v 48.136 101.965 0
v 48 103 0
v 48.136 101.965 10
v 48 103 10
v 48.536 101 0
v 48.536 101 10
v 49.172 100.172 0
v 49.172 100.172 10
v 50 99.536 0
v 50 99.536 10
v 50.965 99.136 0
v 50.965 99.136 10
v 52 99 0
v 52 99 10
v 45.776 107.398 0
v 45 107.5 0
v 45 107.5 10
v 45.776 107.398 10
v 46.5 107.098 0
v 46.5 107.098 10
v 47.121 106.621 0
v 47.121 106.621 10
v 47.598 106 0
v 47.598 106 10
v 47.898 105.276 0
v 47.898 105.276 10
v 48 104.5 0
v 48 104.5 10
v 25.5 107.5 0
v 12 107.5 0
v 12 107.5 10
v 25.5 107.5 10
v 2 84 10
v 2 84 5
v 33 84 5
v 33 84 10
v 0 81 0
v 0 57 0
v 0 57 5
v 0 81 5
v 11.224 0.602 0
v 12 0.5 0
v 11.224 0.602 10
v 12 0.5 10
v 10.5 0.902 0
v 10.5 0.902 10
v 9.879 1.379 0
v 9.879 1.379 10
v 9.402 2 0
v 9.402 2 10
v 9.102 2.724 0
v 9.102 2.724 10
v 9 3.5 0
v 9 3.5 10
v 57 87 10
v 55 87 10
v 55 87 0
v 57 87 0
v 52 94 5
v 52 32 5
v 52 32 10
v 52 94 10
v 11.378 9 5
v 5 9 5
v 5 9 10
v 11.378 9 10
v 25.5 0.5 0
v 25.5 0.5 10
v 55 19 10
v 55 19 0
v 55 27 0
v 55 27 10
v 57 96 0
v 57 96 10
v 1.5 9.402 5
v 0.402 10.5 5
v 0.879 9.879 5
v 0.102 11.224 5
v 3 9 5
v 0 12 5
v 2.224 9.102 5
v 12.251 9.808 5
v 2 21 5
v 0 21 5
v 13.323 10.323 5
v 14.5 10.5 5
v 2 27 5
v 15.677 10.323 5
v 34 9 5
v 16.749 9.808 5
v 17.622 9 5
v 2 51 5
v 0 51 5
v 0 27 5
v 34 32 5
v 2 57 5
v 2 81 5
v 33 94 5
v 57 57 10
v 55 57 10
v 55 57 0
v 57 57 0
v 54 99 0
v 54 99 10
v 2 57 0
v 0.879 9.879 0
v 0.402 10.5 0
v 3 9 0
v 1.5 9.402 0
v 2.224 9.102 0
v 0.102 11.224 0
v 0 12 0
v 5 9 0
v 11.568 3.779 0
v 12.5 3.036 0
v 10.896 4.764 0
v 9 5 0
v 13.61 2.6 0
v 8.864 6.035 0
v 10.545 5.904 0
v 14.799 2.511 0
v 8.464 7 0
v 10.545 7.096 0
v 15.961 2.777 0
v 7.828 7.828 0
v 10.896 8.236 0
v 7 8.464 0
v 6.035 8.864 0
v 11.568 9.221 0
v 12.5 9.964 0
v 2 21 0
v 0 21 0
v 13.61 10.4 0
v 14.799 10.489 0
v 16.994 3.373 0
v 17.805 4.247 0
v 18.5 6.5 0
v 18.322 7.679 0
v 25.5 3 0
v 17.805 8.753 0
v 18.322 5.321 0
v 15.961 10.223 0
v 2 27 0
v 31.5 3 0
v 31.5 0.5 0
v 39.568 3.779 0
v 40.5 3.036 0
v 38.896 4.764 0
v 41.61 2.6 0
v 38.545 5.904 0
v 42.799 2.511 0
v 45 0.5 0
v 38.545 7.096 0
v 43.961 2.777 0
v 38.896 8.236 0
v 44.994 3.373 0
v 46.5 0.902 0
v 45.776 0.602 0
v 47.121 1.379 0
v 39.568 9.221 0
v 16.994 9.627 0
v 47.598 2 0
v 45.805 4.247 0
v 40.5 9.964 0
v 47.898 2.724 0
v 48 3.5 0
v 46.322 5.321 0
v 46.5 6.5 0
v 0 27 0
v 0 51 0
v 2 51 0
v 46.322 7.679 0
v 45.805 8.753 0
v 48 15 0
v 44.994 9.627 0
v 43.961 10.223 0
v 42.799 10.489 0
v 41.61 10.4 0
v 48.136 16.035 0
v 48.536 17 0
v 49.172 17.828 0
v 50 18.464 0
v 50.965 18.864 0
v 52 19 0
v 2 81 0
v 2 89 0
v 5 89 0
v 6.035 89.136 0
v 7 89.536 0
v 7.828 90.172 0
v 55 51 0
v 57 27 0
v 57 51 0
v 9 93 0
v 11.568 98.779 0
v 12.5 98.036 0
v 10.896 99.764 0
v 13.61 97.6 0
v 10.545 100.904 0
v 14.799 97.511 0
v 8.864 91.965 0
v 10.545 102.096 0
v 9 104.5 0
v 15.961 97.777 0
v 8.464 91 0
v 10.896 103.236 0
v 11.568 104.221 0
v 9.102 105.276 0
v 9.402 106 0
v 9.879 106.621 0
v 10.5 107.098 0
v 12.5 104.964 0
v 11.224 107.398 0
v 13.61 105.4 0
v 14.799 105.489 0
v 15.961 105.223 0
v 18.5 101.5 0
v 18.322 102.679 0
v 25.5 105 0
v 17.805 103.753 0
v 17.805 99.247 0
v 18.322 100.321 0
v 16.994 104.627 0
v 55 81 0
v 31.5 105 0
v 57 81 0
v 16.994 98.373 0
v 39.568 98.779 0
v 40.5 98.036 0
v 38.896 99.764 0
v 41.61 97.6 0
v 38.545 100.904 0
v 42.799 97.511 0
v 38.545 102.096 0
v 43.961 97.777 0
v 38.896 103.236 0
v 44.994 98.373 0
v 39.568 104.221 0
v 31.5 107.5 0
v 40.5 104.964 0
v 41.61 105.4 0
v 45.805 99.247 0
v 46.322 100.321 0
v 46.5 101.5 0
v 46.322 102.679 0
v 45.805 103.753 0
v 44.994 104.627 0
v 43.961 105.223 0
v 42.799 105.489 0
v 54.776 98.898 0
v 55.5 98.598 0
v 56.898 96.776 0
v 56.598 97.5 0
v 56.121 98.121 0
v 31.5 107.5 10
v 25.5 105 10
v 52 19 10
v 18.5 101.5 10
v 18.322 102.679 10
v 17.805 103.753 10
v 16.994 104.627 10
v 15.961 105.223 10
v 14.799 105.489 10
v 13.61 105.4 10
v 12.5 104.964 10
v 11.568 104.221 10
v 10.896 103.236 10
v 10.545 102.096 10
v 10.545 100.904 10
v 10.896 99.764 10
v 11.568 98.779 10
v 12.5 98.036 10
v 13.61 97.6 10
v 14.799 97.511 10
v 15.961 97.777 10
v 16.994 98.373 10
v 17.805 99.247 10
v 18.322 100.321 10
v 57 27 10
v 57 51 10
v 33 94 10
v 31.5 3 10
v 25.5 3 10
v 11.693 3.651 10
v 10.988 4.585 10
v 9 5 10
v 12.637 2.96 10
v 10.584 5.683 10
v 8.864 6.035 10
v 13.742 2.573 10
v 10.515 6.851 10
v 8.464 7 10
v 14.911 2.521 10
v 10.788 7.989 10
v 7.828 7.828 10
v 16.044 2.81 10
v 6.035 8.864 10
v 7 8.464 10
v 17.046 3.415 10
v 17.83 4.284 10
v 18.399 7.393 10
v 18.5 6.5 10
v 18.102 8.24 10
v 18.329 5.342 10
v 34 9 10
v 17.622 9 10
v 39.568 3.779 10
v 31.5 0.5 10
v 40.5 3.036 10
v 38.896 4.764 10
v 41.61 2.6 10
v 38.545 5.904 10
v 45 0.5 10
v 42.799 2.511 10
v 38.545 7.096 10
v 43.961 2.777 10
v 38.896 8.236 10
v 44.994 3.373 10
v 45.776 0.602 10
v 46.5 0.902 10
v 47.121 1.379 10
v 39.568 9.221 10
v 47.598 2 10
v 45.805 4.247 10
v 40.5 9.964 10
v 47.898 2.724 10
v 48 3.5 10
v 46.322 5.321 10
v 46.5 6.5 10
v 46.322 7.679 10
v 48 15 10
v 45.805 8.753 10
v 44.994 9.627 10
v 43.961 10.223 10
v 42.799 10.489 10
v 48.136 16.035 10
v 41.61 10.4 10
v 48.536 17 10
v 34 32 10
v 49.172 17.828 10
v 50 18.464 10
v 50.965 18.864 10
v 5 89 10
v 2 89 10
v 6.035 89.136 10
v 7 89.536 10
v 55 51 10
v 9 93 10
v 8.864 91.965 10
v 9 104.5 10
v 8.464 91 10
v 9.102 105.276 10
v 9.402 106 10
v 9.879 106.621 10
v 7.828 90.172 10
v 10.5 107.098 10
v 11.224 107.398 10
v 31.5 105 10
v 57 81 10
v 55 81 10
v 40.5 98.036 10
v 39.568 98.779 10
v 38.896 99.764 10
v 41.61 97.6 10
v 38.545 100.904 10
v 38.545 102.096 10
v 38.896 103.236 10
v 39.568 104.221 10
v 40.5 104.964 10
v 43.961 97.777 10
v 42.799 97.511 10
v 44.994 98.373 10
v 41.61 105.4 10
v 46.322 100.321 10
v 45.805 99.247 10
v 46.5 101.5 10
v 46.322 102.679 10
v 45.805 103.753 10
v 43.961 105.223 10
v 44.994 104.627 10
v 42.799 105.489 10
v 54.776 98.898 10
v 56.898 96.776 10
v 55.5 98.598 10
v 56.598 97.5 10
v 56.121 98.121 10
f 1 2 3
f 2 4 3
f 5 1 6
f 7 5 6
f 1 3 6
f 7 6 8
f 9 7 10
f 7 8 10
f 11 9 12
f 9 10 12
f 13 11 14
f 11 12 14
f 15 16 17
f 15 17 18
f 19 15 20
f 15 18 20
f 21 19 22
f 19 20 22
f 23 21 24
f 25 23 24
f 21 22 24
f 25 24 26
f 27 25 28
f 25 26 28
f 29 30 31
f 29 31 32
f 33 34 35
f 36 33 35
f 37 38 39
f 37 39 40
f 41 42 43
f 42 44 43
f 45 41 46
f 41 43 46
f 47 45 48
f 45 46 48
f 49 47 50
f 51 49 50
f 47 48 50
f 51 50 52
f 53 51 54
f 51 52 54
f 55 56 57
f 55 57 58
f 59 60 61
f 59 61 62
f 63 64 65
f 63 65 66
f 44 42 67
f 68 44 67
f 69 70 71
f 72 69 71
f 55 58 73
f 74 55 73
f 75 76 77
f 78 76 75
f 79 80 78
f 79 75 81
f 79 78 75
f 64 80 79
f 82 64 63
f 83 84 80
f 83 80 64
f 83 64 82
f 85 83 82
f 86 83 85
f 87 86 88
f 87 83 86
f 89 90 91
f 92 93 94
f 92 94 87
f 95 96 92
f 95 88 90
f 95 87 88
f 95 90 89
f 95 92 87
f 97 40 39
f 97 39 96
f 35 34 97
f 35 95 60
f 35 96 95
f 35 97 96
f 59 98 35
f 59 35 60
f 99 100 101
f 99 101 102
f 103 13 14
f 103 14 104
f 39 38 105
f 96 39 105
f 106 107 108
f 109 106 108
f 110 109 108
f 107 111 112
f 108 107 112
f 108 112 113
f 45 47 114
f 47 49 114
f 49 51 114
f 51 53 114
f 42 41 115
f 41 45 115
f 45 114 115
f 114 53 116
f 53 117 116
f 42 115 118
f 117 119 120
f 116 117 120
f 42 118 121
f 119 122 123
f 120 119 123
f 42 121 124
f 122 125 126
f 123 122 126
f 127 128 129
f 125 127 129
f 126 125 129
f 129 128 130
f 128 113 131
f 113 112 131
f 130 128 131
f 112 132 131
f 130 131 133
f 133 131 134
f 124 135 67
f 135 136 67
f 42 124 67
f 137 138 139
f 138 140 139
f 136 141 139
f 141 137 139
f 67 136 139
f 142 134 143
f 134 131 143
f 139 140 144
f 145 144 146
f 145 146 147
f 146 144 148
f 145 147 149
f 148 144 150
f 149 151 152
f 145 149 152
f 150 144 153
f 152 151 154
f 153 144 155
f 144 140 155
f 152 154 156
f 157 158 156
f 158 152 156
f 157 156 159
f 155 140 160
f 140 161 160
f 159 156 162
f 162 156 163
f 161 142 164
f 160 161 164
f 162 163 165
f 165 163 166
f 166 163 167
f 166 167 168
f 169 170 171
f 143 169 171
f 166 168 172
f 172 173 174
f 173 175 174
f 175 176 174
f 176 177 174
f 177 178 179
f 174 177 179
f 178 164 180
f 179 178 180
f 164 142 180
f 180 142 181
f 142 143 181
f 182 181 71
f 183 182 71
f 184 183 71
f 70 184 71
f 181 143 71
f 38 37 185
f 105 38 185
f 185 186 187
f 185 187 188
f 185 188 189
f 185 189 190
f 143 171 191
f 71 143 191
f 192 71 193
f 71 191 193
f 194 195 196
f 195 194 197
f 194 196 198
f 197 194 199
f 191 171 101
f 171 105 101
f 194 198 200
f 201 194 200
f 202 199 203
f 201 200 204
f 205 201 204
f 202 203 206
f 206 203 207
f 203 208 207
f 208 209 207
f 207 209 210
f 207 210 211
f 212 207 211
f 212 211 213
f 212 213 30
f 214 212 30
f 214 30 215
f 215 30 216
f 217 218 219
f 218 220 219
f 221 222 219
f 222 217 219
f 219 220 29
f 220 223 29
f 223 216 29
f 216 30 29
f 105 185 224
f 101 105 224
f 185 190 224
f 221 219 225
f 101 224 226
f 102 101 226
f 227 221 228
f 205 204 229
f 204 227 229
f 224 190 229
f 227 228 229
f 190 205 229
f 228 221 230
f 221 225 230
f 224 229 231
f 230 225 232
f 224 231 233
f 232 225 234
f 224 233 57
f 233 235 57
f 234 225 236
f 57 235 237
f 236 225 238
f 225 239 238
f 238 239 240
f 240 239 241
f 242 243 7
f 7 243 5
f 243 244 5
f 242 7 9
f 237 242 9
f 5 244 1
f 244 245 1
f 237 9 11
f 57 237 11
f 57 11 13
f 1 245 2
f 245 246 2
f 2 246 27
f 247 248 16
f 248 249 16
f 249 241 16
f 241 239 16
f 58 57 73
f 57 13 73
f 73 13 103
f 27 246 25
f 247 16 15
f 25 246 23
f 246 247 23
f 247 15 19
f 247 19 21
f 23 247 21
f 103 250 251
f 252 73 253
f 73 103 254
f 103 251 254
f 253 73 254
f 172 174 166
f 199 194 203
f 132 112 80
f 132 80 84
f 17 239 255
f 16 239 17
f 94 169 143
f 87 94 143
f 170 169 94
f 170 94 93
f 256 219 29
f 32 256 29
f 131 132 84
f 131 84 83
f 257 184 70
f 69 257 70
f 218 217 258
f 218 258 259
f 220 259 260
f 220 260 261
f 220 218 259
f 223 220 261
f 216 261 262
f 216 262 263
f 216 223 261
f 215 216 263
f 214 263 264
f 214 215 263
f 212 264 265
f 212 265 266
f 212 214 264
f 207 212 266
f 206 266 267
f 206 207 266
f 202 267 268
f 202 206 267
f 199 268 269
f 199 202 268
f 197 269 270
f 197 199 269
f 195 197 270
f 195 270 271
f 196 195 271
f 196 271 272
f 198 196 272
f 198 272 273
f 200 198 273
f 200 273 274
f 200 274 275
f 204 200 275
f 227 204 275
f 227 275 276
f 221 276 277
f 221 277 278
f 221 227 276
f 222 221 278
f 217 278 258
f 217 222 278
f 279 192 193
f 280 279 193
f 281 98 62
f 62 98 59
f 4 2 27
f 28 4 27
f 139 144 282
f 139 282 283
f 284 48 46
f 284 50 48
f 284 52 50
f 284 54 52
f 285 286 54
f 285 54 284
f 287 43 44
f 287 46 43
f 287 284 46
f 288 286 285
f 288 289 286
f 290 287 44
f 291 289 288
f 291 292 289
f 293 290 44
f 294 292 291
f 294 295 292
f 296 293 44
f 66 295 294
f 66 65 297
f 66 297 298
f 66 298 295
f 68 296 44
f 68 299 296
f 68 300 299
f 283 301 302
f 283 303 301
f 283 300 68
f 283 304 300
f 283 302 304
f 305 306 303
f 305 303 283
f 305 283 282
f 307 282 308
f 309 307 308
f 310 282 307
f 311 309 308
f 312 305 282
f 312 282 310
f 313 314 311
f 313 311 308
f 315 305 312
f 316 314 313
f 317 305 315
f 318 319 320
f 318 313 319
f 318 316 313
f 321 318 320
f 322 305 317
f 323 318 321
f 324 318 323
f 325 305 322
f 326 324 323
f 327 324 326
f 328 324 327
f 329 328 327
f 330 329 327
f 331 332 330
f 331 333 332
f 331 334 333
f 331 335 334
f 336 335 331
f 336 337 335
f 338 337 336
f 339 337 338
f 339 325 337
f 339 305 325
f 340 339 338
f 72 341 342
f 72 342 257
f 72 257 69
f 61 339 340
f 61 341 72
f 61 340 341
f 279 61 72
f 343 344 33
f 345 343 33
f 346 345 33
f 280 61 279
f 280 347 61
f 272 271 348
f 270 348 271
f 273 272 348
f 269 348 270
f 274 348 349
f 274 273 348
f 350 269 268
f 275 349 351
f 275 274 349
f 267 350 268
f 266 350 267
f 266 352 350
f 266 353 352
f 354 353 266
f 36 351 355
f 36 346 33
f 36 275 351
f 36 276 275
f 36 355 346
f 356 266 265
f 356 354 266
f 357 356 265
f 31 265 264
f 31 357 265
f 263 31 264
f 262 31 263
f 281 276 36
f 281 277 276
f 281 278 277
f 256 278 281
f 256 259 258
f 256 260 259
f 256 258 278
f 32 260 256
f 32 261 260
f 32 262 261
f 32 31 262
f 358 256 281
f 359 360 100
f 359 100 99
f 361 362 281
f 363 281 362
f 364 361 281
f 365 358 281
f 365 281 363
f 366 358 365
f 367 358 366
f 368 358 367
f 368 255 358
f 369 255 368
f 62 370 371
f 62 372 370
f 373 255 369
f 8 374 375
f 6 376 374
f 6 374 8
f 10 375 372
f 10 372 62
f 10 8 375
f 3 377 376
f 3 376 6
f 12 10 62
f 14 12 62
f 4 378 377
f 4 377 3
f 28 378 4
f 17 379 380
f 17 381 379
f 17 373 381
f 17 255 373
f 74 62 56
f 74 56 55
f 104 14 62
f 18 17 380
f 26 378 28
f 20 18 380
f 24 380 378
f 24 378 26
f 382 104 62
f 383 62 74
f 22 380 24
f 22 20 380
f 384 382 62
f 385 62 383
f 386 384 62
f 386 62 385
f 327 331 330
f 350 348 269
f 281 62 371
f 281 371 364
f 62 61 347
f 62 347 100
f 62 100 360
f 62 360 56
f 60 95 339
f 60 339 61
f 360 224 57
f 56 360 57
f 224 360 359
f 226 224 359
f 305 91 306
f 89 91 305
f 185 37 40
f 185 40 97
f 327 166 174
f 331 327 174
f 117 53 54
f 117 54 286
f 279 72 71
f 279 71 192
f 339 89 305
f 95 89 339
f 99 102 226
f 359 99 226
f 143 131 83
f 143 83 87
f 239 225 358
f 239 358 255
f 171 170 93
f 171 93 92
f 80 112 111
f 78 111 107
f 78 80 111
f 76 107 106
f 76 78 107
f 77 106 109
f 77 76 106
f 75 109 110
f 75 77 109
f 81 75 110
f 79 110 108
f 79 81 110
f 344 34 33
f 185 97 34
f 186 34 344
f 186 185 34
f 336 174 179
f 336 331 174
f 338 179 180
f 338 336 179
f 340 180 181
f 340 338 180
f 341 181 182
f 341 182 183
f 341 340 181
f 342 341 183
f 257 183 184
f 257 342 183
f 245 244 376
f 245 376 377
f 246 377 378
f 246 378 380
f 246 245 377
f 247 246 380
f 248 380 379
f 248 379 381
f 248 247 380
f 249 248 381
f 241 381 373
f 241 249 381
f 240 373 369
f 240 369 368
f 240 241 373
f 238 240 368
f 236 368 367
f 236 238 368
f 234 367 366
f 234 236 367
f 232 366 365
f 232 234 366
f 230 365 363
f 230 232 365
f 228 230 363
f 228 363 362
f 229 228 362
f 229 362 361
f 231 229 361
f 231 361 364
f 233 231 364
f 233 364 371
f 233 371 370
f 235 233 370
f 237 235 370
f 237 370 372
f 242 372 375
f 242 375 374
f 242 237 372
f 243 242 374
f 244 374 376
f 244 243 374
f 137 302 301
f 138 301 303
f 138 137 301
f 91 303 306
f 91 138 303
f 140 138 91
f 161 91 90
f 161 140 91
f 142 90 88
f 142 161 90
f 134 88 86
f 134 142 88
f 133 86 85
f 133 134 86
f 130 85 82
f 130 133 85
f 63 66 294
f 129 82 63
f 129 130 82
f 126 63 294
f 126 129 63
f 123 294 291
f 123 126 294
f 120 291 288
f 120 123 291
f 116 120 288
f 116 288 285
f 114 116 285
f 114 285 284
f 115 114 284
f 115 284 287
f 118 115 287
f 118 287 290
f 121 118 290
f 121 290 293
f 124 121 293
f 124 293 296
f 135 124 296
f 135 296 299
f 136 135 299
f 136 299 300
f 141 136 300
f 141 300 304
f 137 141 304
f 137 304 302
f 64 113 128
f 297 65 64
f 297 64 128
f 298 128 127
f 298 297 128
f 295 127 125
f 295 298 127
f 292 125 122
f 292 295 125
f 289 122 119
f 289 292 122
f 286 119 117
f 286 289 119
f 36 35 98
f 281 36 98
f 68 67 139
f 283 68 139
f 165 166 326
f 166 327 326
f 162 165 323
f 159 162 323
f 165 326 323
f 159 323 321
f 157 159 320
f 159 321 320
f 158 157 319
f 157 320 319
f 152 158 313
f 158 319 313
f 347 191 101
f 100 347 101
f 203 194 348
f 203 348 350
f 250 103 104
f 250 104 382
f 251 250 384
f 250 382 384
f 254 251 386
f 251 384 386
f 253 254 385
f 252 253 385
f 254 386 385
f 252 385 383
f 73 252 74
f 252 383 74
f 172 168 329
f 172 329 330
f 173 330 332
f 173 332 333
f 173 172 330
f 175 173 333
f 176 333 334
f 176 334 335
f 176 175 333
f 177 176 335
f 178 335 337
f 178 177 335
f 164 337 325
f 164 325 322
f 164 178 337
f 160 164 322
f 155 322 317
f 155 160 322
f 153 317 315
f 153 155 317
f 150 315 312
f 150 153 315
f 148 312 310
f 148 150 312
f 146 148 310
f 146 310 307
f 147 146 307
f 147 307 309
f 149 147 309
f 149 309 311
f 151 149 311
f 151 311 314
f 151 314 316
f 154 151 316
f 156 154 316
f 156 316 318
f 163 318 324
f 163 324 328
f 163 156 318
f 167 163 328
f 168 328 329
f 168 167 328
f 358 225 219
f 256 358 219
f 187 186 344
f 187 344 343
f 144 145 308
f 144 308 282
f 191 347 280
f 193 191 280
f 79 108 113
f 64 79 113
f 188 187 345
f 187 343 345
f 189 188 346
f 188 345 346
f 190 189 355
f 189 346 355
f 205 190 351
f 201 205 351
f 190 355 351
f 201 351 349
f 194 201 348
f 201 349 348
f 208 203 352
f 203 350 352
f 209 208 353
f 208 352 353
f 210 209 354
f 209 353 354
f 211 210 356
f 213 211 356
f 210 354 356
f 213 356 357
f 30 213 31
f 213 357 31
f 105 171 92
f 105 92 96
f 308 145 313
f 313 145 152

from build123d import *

# Parameters (mm, degrees)
BOX014_W               = 19
BOX014_H               = 62
BOX014_DEPTH           = 10
BOX013_W               = 34
BOX013_H               = 75
BOX013_DEPTH           = 10
BOX002_W               = 9
BOX002_H               = 9
BOX002_DEPTH           = 10
BOX003_W               = 9
BOX003_H               = 19
BOX003_DEPTH           = 10
BOX004_W               = 9
BOX004_H               = 9
BOX004_DEPTH           = 10
BOX005_W               = 2
BOX005_H               = 6
BOX005_DEPTH           = 10
BOX006_W               = 2
BOX006_H               = 8
BOX006_DEPTH           = 10
BOX007_W               = 2
BOX007_H               = 6
BOX007_DEPTH           = 10
BOX008_W               = 2
BOX008_H               = 6
BOX008_DEPTH           = 10
BOX009_W               = 2
BOX009_H               = 6
BOX009_DEPTH           = 10
BOX010_W               = 2
BOX010_H               = 8
BOX010_DEPTH           = 10
CYLINDER_R             = 4
CYLINDER_DEPTH         = 10
CYLINDER002_R          = 4
CYLINDER002_DEPTH      = 10
CYLINDER001_R          = 4
CYLINDER001_DEPTH      = 10
CYLINDER003_R          = 4
CYLINDER003_DEPTH      = 10
BOX011_W               = 3
BOX011_H               = 6
BOX011_DEPTH           = 10
BOX011_PLACEMENT_ANGLE = 90
BOX012_W               = 3
BOX012_H               = 6
BOX012_DEPTH           = 10
BOX012_PLACEMENT_ANGLE = 90
BOX001_W               = 9
BOX001_H               = 19
BOX001_DEPTH           = 10
BOX_W                  = 57
BOX_H                  = 107
BOX_DEPTH              = 10
FILLET_R               = 3
FILLET001_R            = 4


with BuildPart() as cube014:
    # Box014 → Box014 (new body)
    with BuildSketch(Plane(origin=(33, 32, 5), x_dir=(1, 0, 0), z_dir=(0, 0, 1))):
        with Locations((9.5, 31)):
            Rectangle(BOX014_W, BOX014_H)
    extrude(amount=BOX014_DEPTH)


with BuildPart() as fusion001:
    # Box013 → Box013 (new body)
    with BuildSketch(Plane(origin=(0, 9, 5), x_dir=(1, 0, 0), z_dir=(0, 0, 1))):
        with Locations((17, 37.5)):
            Rectangle(BOX013_W, BOX013_H)
    extrude(amount=BOX013_DEPTH)

    # Fusion001: union Cube014
    add(cube014.part)


with BuildPart() as cube002:
    # Box002 → Box002 (new body)
    with BuildSketch(Plane.XY):
        with Locations((4.5, 4.5)):
            Rectangle(BOX002_W, BOX002_H)
    extrude(amount=BOX002_DEPTH)


with BuildPart() as cube003:
    # Box003 → Box003 (new body)
    with BuildSketch(Plane(origin=(0, 89, 0), x_dir=(1, 0, 0), z_dir=(0, 0, 1))):
        with Locations((4.5, 9.5)):
            Rectangle(BOX003_W, BOX003_H)
    extrude(amount=BOX003_DEPTH)


with BuildPart() as cube004:
    # Box004 → Box004 (new body)
    with BuildSketch(Plane(origin=(48, 99, 0), x_dir=(1, 0, 0), z_dir=(0, 0, 1))):
        with Locations((4.5, 4.5)):
            Rectangle(BOX004_W, BOX004_H)
    extrude(amount=BOX004_DEPTH)


with BuildPart() as cube005:
    # Box005 → Box005 (new body)
    with BuildSketch(Plane(origin=(0, 51, 0), x_dir=(1, 0, 0), z_dir=(0, 0, 1))):
        with Locations((1, 3)):
            Rectangle(BOX005_W, BOX005_H)
    extrude(amount=BOX005_DEPTH)


with BuildPart() as cube006:
    # Box006 → Box006 (new body)
    with BuildSketch(Plane(origin=(0, 81, 0), x_dir=(1, 0, 0), z_dir=(0, 0, 1))):
        with Locations((1, 4)):
            Rectangle(BOX006_W, BOX006_H)
    extrude(amount=BOX006_DEPTH)


with BuildPart() as cube007:
    # Box007 → Box007 (new body)
    with BuildSketch(Plane(origin=(0, 21, 0), x_dir=(1, 0, 0), z_dir=(0, 0, 1))):
        with Locations((1, 3)):
            Rectangle(BOX007_W, BOX007_H)
    extrude(amount=BOX007_DEPTH)


with BuildPart() as cube008:
    # Box008 → Box008 (new body)
    with BuildSketch(Plane(origin=(55, 51, 0), x_dir=(1, 0, 0), z_dir=(0, 0, 1))):
        with Locations((1, 3)):
            Rectangle(BOX008_W, BOX008_H)
    extrude(amount=BOX008_DEPTH)


with BuildPart() as cube009:
    # Box009 → Box009 (new body)
    with BuildSketch(Plane(origin=(55, 81, 0), x_dir=(1, 0, 0), z_dir=(0, 0, 1))):
        with Locations((1, 3)):
            Rectangle(BOX009_W, BOX009_H)
    extrude(amount=BOX009_DEPTH)


with BuildPart() as cube010:
    # Box010 → Box010 (new body)
    with BuildSketch(Plane(origin=(55, 19, 0), x_dir=(1, 0, 0), z_dir=(0, 0, 1))):
        with Locations((1, 4)):
            Rectangle(BOX010_W, BOX010_H)
    extrude(amount=BOX010_DEPTH)


with BuildPart() as cylinder:
    # Cylinder → Cylinder (new body)
    with BuildSketch(Plane(origin=(14.5, 6.5, 0), x_dir=(1, 0, 0), z_dir=(0, 0, 1))):
        Circle(CYLINDER_R)
    extrude(amount=CYLINDER_DEPTH)


with BuildPart() as cylinder002:
    # Cylinder002 → Cylinder002 (new body)
    with BuildSketch(Plane(origin=(42.5, 101.5, 0), x_dir=(1, 0, 0), z_dir=(0, 0, 1))):
        Circle(CYLINDER002_R)
    extrude(amount=CYLINDER002_DEPTH)


with BuildPart() as cylinder001:
    # Cylinder001 → Cylinder001 (new body)
    with BuildSketch(Plane(origin=(42.5, 6.5, 0), x_dir=(1, 0, 0), z_dir=(0, 0, 1))):
        Circle(CYLINDER001_R)
    extrude(amount=CYLINDER001_DEPTH)


with BuildPart() as cylinder003:
    # Cylinder003 → Cylinder003 (new body)
    with BuildSketch(Plane(origin=(14.5, 101.5, 0), x_dir=(1, 0, 0), z_dir=(0, 0, 1))):
        Circle(CYLINDER003_R)
    extrude(amount=CYLINDER003_DEPTH)


with BuildPart() as cube011:
    # Box011 → Box011 (new body)
    with BuildSketch(Plane.XY):
        with Locations((1.5, 3)):
            Rectangle(BOX011_W, BOX011_H)
    extrude(amount=BOX011_DEPTH)


with BuildPart() as cube011_1:
    # Box011 placement: moved
    add(cube011.part.moved(Location((31.5, 0, 0))).rotate(Axis((31.5, 0, 0), (0, 0, 1)), BOX011_PLACEMENT_ANGLE))


with BuildPart() as cube012:
    # Box012 → Box012 (new body)
    with BuildSketch(Plane.XY):
        with Locations((1.5, 3)):
            Rectangle(BOX012_W, BOX012_H)
    extrude(amount=BOX012_DEPTH)


with BuildPart() as cube012_1:
    # Box012 placement: moved
    add(cube012.part.moved(Location((31.5, 105, 0))).rotate(Axis((31.5, 105, 0), (0, 0, 1)), BOX012_PLACEMENT_ANGLE))


with BuildPart() as fusion:
    # Box001 → Box001 (new body)
    with BuildSketch(Plane(origin=(48, 0, 0), x_dir=(1, 0, 0), z_dir=(0, 0, 1))):
        with Locations((4.5, 9.5)):
            Rectangle(BOX001_W, BOX001_H)
    extrude(amount=BOX001_DEPTH)

    # Fusion: union Cube002, Cube003, Cube004, Cube005, Cube006, Cube007, Cube008, Cube009, Cube010, Cylinder, Cylinder002, Cylinder001, Cylinder003, Cube011, Cube012
    add(cube002.part)
    add(cube003.part)
    add(cube004.part)
    add(cube005.part)
    add(cube006.part)
    add(cube007.part)
    add(cube008.part)
    add(cube009.part)
    add(cube010.part)
    add(cylinder.part)
    add(cylinder002.part)
    add(cylinder001.part)
    add(cylinder003.part)
    add(cube011_1.part)
    add(cube012_1.part)


with BuildPart() as cut001:
    # Box → Box (new body)
    with BuildSketch(Plane(origin=(0, 0.5, 0), x_dir=(1, 0, 0), z_dir=(0, 0, 1))):
        with Locations((28.5, 53.5)):
            Rectangle(BOX_W, BOX_H)
    extrude(amount=BOX_DEPTH)

    # Cut: cut Fusion
    add(fusion.part, mode=Mode.SUBTRACT)

    # Fillet
    fillet_edges = [cut001.edges().sort_by_distance(p)[0] for p in [
        (9, 107.5, 5),
        (48, 107.5, 5),
        (57, 99, 5),
        (48, 0.5, 5),
        (9, 0.5, 5),
        (0, 9, 5),
    ]]
    fillet(fillet_edges, radius=FILLET_R)

    # Fillet001
    fillet001_edges = [cut001.edges().sort_by_distance(p)[0] for p in [
        (9, 89, 5),
        (48, 99, 5),
        (9, 9, 5),
        (48, 19, 5),
    ]]
    fillet(fillet001_edges, radius=FILLET001_R)

    # Cut001: cut Fusion001
    add(fusion001.part, mode=Mode.SUBTRACT)


solid = cut001.part
